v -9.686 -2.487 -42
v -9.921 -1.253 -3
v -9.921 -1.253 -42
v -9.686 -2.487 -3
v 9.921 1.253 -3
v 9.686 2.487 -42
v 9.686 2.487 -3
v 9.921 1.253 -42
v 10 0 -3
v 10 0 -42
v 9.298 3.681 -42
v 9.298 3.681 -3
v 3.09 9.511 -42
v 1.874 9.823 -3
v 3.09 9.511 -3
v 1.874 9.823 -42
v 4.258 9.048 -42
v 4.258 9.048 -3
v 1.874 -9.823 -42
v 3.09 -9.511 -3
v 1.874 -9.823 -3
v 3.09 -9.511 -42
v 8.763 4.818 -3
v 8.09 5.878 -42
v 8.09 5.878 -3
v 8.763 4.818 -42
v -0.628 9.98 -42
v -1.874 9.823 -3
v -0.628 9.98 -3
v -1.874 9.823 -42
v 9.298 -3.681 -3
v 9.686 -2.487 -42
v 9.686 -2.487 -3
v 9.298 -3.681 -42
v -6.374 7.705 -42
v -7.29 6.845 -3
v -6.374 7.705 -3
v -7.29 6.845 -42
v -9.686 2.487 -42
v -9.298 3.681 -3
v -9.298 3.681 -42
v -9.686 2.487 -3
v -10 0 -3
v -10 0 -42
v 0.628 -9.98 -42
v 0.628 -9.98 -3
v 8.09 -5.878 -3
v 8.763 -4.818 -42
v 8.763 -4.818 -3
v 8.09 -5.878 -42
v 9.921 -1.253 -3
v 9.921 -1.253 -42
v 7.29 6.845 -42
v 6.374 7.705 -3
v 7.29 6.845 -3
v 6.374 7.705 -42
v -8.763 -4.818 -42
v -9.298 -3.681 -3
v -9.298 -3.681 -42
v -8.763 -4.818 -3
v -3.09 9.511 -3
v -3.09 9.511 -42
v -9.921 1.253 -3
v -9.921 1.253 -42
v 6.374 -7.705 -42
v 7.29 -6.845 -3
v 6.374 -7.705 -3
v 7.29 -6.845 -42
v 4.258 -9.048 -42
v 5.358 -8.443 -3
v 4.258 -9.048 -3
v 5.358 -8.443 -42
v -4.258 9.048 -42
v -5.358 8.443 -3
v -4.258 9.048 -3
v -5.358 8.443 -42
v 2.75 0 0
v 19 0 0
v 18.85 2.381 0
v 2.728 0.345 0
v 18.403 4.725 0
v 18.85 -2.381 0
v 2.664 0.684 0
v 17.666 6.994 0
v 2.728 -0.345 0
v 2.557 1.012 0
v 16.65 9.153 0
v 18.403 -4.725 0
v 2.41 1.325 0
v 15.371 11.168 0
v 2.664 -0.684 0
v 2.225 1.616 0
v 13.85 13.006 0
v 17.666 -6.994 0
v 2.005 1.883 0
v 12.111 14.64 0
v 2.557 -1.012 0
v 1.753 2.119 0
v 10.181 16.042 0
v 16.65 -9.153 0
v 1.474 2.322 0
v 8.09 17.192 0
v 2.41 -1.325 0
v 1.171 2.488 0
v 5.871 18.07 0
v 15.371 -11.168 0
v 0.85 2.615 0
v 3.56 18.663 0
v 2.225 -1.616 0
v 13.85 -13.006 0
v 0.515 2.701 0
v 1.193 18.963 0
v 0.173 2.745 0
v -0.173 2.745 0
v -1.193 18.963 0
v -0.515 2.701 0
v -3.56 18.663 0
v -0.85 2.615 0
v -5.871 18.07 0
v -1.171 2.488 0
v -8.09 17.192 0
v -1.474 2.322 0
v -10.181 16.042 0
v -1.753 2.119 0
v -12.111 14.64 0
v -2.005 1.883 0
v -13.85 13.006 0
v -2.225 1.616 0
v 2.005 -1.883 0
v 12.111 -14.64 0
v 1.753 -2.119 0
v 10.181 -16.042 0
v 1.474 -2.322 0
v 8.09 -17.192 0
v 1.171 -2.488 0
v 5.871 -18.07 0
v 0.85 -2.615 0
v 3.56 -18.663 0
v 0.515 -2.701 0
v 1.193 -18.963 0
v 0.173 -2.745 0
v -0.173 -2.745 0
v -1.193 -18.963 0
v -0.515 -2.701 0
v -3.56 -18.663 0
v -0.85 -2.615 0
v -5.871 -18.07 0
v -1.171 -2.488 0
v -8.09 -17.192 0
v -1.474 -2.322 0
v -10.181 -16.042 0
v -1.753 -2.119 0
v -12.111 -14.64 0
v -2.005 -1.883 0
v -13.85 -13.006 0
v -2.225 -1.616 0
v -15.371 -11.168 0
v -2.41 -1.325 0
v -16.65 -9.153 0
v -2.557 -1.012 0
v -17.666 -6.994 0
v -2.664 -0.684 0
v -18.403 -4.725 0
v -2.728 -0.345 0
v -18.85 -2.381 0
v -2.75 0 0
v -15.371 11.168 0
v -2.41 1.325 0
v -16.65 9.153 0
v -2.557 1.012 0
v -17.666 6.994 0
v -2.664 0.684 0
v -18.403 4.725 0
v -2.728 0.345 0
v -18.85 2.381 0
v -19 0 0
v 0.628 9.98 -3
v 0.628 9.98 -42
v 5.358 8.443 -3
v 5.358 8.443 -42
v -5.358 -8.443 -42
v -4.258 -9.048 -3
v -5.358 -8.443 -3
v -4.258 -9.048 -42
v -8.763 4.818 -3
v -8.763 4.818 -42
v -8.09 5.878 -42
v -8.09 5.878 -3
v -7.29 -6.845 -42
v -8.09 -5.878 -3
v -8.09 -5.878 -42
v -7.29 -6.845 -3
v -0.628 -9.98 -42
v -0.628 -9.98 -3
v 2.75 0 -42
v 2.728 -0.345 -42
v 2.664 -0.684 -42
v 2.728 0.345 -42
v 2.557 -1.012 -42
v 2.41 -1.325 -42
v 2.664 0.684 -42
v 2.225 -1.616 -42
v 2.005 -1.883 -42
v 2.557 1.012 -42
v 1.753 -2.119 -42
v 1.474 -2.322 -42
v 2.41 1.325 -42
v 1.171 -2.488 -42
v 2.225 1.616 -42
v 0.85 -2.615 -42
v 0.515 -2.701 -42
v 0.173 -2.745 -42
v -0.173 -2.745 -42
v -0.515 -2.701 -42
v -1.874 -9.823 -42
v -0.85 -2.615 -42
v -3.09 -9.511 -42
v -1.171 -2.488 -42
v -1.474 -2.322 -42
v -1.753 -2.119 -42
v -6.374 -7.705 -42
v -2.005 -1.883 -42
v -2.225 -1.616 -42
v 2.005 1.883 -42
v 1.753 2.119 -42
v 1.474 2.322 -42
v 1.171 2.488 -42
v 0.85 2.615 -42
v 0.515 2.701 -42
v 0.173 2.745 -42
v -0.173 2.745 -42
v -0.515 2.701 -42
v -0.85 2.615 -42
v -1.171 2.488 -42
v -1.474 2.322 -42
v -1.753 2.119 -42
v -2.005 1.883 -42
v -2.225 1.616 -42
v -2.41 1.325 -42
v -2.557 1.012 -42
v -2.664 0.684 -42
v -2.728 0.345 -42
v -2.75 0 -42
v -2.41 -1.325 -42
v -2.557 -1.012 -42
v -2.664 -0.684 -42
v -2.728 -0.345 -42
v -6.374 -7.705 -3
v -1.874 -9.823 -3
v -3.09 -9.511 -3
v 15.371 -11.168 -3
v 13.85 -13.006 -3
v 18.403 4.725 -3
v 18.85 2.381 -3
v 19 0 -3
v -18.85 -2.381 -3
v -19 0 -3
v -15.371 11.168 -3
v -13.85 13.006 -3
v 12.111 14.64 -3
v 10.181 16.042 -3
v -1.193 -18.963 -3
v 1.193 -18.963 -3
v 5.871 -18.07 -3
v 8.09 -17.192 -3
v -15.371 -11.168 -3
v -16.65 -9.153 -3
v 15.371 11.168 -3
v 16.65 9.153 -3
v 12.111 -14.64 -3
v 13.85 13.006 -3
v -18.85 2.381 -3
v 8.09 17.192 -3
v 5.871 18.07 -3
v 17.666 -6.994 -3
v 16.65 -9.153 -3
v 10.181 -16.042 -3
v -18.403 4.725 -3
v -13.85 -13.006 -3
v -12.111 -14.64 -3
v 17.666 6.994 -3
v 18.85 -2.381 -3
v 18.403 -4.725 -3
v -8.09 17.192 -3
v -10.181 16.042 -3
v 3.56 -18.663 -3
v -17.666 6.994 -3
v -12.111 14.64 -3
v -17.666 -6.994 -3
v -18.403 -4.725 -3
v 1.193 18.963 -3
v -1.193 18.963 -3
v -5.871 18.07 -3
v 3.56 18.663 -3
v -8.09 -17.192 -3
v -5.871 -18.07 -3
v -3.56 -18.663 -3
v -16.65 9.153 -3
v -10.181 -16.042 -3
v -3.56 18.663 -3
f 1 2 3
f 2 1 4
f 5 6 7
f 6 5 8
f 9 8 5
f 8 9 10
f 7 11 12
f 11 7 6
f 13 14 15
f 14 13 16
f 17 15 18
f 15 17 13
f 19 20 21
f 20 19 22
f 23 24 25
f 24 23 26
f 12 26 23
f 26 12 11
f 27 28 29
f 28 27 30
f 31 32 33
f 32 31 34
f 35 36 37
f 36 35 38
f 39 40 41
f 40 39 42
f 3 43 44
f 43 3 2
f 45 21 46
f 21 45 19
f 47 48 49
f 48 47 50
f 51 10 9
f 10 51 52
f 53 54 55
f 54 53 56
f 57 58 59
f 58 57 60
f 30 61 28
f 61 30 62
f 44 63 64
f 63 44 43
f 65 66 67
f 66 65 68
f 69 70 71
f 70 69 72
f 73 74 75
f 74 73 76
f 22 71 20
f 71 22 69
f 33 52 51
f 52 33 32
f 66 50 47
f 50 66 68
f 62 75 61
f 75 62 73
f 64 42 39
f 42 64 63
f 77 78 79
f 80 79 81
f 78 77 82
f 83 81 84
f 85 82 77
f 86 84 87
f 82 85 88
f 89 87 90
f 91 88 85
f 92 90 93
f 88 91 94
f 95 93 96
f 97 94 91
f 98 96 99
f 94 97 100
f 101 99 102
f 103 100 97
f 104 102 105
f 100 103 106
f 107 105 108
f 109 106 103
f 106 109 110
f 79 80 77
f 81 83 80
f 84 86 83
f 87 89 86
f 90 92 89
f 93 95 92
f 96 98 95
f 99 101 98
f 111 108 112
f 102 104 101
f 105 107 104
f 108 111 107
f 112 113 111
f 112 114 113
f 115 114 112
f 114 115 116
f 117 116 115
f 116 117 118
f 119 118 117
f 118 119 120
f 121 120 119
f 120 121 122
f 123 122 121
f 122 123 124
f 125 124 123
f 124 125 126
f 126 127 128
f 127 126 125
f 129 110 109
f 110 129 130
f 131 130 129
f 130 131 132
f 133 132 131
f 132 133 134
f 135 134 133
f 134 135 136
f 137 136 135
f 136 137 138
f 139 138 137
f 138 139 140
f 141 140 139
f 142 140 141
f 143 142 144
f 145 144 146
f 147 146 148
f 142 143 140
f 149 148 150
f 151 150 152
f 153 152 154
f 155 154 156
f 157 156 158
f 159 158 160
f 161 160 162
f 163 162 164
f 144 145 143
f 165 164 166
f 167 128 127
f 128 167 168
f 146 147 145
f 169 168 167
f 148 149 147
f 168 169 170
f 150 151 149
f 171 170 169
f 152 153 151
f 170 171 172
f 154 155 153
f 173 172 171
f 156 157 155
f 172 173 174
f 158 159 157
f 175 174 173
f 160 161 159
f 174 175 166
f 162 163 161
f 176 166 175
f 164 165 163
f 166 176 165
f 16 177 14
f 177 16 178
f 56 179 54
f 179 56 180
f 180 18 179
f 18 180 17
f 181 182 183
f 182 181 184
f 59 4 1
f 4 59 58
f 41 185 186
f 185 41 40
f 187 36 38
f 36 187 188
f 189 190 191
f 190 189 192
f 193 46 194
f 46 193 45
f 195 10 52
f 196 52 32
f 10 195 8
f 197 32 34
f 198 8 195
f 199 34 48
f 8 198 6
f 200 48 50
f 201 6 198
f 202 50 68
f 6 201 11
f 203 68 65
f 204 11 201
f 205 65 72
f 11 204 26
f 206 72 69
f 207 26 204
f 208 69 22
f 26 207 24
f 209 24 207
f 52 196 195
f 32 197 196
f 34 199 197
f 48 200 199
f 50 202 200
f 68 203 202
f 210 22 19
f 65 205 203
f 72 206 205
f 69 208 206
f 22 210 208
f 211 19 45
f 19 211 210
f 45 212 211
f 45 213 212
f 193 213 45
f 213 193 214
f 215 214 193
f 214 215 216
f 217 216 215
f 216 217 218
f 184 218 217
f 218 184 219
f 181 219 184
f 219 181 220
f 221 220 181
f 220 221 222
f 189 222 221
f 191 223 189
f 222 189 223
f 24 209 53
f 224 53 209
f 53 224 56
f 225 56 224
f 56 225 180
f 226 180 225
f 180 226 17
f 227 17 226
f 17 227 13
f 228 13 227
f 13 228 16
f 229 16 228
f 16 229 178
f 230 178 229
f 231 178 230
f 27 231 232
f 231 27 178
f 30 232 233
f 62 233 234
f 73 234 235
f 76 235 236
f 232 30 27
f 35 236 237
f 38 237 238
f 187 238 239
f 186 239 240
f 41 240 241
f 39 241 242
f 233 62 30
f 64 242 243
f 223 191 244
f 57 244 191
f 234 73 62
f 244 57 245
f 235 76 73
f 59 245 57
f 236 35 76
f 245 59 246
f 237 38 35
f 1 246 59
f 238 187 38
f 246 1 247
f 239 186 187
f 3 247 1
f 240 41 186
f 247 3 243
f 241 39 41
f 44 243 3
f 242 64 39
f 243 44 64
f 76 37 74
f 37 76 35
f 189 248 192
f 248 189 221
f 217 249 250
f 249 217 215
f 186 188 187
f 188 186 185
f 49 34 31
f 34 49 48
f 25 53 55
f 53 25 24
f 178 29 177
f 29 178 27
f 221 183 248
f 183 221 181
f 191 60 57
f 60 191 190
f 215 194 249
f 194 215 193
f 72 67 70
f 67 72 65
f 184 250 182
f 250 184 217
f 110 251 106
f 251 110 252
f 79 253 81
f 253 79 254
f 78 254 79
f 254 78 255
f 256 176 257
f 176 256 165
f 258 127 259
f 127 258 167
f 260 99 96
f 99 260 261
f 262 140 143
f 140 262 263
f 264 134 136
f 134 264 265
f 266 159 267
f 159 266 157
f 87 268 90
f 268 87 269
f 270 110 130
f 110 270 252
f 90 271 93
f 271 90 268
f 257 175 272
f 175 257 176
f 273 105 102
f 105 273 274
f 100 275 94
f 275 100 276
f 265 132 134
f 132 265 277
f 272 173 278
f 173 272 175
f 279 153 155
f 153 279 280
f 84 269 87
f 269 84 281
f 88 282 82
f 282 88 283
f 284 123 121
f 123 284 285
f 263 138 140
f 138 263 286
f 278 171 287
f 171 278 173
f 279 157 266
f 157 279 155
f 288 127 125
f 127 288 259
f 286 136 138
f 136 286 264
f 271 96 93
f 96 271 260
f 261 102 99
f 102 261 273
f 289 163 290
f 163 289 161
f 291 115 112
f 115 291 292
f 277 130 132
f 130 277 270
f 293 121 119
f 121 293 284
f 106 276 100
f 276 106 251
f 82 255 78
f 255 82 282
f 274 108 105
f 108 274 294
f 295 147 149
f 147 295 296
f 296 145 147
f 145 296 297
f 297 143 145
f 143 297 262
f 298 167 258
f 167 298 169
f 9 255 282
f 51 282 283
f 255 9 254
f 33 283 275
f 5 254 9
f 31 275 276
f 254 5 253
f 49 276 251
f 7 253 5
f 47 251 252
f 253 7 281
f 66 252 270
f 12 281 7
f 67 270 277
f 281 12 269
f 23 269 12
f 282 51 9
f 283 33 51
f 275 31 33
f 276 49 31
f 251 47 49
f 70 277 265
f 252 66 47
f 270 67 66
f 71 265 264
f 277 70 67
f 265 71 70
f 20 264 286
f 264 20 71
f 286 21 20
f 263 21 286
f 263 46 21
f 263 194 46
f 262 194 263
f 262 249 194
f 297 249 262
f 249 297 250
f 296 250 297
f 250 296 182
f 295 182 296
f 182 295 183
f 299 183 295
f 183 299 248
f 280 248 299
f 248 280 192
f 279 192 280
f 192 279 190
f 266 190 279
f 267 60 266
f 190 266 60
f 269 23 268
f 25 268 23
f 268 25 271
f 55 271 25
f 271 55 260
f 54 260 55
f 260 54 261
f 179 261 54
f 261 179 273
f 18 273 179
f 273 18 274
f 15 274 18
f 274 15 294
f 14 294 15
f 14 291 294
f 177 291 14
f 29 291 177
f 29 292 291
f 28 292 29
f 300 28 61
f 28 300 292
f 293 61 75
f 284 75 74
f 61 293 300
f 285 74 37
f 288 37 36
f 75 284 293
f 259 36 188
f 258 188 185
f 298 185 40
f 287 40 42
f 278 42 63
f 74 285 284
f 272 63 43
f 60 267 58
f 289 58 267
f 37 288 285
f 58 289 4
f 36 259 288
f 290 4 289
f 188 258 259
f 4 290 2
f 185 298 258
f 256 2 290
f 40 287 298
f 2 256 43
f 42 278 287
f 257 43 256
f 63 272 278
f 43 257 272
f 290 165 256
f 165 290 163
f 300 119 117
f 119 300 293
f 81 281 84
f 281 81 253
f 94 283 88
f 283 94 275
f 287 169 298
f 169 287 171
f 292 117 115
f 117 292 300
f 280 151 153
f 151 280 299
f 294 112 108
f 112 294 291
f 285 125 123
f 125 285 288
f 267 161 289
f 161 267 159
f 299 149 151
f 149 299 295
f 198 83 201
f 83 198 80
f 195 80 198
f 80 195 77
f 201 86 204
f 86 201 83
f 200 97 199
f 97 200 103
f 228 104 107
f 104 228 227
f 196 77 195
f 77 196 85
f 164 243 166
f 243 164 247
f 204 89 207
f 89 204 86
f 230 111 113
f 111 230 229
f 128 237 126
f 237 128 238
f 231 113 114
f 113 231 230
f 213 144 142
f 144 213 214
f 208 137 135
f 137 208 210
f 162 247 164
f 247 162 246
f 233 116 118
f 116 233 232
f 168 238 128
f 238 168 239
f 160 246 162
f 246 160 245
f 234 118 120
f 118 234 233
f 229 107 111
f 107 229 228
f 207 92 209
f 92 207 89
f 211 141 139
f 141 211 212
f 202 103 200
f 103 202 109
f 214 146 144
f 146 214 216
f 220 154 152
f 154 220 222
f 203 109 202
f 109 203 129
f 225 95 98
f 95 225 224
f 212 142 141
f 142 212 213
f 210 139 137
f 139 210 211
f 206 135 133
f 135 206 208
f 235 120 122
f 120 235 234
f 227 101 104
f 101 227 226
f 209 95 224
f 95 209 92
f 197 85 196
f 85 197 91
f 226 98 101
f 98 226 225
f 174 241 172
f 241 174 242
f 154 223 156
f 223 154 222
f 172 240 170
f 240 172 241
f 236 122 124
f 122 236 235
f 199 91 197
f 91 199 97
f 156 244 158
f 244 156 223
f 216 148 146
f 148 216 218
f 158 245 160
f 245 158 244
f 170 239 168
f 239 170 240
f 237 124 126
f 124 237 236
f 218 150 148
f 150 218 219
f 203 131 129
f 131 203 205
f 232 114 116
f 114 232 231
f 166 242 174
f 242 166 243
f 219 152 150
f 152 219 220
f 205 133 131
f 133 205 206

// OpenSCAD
$fn = 50;


difference() {
	union() {
		translate(v = [0, 0, -42.0000000000]) {
			cylinder(h = 42, r = 10.0000000000);
		}
		translate(v = [0, 0, -3.0000000000]) {
			cylinder(h = 3, r = 19.0000000000);
		}
	}
	union() {
		#translate(v = [0, 0, -42]) {
			cylinder(h = 42, r = 2.7500000000);
		}
	}
}
